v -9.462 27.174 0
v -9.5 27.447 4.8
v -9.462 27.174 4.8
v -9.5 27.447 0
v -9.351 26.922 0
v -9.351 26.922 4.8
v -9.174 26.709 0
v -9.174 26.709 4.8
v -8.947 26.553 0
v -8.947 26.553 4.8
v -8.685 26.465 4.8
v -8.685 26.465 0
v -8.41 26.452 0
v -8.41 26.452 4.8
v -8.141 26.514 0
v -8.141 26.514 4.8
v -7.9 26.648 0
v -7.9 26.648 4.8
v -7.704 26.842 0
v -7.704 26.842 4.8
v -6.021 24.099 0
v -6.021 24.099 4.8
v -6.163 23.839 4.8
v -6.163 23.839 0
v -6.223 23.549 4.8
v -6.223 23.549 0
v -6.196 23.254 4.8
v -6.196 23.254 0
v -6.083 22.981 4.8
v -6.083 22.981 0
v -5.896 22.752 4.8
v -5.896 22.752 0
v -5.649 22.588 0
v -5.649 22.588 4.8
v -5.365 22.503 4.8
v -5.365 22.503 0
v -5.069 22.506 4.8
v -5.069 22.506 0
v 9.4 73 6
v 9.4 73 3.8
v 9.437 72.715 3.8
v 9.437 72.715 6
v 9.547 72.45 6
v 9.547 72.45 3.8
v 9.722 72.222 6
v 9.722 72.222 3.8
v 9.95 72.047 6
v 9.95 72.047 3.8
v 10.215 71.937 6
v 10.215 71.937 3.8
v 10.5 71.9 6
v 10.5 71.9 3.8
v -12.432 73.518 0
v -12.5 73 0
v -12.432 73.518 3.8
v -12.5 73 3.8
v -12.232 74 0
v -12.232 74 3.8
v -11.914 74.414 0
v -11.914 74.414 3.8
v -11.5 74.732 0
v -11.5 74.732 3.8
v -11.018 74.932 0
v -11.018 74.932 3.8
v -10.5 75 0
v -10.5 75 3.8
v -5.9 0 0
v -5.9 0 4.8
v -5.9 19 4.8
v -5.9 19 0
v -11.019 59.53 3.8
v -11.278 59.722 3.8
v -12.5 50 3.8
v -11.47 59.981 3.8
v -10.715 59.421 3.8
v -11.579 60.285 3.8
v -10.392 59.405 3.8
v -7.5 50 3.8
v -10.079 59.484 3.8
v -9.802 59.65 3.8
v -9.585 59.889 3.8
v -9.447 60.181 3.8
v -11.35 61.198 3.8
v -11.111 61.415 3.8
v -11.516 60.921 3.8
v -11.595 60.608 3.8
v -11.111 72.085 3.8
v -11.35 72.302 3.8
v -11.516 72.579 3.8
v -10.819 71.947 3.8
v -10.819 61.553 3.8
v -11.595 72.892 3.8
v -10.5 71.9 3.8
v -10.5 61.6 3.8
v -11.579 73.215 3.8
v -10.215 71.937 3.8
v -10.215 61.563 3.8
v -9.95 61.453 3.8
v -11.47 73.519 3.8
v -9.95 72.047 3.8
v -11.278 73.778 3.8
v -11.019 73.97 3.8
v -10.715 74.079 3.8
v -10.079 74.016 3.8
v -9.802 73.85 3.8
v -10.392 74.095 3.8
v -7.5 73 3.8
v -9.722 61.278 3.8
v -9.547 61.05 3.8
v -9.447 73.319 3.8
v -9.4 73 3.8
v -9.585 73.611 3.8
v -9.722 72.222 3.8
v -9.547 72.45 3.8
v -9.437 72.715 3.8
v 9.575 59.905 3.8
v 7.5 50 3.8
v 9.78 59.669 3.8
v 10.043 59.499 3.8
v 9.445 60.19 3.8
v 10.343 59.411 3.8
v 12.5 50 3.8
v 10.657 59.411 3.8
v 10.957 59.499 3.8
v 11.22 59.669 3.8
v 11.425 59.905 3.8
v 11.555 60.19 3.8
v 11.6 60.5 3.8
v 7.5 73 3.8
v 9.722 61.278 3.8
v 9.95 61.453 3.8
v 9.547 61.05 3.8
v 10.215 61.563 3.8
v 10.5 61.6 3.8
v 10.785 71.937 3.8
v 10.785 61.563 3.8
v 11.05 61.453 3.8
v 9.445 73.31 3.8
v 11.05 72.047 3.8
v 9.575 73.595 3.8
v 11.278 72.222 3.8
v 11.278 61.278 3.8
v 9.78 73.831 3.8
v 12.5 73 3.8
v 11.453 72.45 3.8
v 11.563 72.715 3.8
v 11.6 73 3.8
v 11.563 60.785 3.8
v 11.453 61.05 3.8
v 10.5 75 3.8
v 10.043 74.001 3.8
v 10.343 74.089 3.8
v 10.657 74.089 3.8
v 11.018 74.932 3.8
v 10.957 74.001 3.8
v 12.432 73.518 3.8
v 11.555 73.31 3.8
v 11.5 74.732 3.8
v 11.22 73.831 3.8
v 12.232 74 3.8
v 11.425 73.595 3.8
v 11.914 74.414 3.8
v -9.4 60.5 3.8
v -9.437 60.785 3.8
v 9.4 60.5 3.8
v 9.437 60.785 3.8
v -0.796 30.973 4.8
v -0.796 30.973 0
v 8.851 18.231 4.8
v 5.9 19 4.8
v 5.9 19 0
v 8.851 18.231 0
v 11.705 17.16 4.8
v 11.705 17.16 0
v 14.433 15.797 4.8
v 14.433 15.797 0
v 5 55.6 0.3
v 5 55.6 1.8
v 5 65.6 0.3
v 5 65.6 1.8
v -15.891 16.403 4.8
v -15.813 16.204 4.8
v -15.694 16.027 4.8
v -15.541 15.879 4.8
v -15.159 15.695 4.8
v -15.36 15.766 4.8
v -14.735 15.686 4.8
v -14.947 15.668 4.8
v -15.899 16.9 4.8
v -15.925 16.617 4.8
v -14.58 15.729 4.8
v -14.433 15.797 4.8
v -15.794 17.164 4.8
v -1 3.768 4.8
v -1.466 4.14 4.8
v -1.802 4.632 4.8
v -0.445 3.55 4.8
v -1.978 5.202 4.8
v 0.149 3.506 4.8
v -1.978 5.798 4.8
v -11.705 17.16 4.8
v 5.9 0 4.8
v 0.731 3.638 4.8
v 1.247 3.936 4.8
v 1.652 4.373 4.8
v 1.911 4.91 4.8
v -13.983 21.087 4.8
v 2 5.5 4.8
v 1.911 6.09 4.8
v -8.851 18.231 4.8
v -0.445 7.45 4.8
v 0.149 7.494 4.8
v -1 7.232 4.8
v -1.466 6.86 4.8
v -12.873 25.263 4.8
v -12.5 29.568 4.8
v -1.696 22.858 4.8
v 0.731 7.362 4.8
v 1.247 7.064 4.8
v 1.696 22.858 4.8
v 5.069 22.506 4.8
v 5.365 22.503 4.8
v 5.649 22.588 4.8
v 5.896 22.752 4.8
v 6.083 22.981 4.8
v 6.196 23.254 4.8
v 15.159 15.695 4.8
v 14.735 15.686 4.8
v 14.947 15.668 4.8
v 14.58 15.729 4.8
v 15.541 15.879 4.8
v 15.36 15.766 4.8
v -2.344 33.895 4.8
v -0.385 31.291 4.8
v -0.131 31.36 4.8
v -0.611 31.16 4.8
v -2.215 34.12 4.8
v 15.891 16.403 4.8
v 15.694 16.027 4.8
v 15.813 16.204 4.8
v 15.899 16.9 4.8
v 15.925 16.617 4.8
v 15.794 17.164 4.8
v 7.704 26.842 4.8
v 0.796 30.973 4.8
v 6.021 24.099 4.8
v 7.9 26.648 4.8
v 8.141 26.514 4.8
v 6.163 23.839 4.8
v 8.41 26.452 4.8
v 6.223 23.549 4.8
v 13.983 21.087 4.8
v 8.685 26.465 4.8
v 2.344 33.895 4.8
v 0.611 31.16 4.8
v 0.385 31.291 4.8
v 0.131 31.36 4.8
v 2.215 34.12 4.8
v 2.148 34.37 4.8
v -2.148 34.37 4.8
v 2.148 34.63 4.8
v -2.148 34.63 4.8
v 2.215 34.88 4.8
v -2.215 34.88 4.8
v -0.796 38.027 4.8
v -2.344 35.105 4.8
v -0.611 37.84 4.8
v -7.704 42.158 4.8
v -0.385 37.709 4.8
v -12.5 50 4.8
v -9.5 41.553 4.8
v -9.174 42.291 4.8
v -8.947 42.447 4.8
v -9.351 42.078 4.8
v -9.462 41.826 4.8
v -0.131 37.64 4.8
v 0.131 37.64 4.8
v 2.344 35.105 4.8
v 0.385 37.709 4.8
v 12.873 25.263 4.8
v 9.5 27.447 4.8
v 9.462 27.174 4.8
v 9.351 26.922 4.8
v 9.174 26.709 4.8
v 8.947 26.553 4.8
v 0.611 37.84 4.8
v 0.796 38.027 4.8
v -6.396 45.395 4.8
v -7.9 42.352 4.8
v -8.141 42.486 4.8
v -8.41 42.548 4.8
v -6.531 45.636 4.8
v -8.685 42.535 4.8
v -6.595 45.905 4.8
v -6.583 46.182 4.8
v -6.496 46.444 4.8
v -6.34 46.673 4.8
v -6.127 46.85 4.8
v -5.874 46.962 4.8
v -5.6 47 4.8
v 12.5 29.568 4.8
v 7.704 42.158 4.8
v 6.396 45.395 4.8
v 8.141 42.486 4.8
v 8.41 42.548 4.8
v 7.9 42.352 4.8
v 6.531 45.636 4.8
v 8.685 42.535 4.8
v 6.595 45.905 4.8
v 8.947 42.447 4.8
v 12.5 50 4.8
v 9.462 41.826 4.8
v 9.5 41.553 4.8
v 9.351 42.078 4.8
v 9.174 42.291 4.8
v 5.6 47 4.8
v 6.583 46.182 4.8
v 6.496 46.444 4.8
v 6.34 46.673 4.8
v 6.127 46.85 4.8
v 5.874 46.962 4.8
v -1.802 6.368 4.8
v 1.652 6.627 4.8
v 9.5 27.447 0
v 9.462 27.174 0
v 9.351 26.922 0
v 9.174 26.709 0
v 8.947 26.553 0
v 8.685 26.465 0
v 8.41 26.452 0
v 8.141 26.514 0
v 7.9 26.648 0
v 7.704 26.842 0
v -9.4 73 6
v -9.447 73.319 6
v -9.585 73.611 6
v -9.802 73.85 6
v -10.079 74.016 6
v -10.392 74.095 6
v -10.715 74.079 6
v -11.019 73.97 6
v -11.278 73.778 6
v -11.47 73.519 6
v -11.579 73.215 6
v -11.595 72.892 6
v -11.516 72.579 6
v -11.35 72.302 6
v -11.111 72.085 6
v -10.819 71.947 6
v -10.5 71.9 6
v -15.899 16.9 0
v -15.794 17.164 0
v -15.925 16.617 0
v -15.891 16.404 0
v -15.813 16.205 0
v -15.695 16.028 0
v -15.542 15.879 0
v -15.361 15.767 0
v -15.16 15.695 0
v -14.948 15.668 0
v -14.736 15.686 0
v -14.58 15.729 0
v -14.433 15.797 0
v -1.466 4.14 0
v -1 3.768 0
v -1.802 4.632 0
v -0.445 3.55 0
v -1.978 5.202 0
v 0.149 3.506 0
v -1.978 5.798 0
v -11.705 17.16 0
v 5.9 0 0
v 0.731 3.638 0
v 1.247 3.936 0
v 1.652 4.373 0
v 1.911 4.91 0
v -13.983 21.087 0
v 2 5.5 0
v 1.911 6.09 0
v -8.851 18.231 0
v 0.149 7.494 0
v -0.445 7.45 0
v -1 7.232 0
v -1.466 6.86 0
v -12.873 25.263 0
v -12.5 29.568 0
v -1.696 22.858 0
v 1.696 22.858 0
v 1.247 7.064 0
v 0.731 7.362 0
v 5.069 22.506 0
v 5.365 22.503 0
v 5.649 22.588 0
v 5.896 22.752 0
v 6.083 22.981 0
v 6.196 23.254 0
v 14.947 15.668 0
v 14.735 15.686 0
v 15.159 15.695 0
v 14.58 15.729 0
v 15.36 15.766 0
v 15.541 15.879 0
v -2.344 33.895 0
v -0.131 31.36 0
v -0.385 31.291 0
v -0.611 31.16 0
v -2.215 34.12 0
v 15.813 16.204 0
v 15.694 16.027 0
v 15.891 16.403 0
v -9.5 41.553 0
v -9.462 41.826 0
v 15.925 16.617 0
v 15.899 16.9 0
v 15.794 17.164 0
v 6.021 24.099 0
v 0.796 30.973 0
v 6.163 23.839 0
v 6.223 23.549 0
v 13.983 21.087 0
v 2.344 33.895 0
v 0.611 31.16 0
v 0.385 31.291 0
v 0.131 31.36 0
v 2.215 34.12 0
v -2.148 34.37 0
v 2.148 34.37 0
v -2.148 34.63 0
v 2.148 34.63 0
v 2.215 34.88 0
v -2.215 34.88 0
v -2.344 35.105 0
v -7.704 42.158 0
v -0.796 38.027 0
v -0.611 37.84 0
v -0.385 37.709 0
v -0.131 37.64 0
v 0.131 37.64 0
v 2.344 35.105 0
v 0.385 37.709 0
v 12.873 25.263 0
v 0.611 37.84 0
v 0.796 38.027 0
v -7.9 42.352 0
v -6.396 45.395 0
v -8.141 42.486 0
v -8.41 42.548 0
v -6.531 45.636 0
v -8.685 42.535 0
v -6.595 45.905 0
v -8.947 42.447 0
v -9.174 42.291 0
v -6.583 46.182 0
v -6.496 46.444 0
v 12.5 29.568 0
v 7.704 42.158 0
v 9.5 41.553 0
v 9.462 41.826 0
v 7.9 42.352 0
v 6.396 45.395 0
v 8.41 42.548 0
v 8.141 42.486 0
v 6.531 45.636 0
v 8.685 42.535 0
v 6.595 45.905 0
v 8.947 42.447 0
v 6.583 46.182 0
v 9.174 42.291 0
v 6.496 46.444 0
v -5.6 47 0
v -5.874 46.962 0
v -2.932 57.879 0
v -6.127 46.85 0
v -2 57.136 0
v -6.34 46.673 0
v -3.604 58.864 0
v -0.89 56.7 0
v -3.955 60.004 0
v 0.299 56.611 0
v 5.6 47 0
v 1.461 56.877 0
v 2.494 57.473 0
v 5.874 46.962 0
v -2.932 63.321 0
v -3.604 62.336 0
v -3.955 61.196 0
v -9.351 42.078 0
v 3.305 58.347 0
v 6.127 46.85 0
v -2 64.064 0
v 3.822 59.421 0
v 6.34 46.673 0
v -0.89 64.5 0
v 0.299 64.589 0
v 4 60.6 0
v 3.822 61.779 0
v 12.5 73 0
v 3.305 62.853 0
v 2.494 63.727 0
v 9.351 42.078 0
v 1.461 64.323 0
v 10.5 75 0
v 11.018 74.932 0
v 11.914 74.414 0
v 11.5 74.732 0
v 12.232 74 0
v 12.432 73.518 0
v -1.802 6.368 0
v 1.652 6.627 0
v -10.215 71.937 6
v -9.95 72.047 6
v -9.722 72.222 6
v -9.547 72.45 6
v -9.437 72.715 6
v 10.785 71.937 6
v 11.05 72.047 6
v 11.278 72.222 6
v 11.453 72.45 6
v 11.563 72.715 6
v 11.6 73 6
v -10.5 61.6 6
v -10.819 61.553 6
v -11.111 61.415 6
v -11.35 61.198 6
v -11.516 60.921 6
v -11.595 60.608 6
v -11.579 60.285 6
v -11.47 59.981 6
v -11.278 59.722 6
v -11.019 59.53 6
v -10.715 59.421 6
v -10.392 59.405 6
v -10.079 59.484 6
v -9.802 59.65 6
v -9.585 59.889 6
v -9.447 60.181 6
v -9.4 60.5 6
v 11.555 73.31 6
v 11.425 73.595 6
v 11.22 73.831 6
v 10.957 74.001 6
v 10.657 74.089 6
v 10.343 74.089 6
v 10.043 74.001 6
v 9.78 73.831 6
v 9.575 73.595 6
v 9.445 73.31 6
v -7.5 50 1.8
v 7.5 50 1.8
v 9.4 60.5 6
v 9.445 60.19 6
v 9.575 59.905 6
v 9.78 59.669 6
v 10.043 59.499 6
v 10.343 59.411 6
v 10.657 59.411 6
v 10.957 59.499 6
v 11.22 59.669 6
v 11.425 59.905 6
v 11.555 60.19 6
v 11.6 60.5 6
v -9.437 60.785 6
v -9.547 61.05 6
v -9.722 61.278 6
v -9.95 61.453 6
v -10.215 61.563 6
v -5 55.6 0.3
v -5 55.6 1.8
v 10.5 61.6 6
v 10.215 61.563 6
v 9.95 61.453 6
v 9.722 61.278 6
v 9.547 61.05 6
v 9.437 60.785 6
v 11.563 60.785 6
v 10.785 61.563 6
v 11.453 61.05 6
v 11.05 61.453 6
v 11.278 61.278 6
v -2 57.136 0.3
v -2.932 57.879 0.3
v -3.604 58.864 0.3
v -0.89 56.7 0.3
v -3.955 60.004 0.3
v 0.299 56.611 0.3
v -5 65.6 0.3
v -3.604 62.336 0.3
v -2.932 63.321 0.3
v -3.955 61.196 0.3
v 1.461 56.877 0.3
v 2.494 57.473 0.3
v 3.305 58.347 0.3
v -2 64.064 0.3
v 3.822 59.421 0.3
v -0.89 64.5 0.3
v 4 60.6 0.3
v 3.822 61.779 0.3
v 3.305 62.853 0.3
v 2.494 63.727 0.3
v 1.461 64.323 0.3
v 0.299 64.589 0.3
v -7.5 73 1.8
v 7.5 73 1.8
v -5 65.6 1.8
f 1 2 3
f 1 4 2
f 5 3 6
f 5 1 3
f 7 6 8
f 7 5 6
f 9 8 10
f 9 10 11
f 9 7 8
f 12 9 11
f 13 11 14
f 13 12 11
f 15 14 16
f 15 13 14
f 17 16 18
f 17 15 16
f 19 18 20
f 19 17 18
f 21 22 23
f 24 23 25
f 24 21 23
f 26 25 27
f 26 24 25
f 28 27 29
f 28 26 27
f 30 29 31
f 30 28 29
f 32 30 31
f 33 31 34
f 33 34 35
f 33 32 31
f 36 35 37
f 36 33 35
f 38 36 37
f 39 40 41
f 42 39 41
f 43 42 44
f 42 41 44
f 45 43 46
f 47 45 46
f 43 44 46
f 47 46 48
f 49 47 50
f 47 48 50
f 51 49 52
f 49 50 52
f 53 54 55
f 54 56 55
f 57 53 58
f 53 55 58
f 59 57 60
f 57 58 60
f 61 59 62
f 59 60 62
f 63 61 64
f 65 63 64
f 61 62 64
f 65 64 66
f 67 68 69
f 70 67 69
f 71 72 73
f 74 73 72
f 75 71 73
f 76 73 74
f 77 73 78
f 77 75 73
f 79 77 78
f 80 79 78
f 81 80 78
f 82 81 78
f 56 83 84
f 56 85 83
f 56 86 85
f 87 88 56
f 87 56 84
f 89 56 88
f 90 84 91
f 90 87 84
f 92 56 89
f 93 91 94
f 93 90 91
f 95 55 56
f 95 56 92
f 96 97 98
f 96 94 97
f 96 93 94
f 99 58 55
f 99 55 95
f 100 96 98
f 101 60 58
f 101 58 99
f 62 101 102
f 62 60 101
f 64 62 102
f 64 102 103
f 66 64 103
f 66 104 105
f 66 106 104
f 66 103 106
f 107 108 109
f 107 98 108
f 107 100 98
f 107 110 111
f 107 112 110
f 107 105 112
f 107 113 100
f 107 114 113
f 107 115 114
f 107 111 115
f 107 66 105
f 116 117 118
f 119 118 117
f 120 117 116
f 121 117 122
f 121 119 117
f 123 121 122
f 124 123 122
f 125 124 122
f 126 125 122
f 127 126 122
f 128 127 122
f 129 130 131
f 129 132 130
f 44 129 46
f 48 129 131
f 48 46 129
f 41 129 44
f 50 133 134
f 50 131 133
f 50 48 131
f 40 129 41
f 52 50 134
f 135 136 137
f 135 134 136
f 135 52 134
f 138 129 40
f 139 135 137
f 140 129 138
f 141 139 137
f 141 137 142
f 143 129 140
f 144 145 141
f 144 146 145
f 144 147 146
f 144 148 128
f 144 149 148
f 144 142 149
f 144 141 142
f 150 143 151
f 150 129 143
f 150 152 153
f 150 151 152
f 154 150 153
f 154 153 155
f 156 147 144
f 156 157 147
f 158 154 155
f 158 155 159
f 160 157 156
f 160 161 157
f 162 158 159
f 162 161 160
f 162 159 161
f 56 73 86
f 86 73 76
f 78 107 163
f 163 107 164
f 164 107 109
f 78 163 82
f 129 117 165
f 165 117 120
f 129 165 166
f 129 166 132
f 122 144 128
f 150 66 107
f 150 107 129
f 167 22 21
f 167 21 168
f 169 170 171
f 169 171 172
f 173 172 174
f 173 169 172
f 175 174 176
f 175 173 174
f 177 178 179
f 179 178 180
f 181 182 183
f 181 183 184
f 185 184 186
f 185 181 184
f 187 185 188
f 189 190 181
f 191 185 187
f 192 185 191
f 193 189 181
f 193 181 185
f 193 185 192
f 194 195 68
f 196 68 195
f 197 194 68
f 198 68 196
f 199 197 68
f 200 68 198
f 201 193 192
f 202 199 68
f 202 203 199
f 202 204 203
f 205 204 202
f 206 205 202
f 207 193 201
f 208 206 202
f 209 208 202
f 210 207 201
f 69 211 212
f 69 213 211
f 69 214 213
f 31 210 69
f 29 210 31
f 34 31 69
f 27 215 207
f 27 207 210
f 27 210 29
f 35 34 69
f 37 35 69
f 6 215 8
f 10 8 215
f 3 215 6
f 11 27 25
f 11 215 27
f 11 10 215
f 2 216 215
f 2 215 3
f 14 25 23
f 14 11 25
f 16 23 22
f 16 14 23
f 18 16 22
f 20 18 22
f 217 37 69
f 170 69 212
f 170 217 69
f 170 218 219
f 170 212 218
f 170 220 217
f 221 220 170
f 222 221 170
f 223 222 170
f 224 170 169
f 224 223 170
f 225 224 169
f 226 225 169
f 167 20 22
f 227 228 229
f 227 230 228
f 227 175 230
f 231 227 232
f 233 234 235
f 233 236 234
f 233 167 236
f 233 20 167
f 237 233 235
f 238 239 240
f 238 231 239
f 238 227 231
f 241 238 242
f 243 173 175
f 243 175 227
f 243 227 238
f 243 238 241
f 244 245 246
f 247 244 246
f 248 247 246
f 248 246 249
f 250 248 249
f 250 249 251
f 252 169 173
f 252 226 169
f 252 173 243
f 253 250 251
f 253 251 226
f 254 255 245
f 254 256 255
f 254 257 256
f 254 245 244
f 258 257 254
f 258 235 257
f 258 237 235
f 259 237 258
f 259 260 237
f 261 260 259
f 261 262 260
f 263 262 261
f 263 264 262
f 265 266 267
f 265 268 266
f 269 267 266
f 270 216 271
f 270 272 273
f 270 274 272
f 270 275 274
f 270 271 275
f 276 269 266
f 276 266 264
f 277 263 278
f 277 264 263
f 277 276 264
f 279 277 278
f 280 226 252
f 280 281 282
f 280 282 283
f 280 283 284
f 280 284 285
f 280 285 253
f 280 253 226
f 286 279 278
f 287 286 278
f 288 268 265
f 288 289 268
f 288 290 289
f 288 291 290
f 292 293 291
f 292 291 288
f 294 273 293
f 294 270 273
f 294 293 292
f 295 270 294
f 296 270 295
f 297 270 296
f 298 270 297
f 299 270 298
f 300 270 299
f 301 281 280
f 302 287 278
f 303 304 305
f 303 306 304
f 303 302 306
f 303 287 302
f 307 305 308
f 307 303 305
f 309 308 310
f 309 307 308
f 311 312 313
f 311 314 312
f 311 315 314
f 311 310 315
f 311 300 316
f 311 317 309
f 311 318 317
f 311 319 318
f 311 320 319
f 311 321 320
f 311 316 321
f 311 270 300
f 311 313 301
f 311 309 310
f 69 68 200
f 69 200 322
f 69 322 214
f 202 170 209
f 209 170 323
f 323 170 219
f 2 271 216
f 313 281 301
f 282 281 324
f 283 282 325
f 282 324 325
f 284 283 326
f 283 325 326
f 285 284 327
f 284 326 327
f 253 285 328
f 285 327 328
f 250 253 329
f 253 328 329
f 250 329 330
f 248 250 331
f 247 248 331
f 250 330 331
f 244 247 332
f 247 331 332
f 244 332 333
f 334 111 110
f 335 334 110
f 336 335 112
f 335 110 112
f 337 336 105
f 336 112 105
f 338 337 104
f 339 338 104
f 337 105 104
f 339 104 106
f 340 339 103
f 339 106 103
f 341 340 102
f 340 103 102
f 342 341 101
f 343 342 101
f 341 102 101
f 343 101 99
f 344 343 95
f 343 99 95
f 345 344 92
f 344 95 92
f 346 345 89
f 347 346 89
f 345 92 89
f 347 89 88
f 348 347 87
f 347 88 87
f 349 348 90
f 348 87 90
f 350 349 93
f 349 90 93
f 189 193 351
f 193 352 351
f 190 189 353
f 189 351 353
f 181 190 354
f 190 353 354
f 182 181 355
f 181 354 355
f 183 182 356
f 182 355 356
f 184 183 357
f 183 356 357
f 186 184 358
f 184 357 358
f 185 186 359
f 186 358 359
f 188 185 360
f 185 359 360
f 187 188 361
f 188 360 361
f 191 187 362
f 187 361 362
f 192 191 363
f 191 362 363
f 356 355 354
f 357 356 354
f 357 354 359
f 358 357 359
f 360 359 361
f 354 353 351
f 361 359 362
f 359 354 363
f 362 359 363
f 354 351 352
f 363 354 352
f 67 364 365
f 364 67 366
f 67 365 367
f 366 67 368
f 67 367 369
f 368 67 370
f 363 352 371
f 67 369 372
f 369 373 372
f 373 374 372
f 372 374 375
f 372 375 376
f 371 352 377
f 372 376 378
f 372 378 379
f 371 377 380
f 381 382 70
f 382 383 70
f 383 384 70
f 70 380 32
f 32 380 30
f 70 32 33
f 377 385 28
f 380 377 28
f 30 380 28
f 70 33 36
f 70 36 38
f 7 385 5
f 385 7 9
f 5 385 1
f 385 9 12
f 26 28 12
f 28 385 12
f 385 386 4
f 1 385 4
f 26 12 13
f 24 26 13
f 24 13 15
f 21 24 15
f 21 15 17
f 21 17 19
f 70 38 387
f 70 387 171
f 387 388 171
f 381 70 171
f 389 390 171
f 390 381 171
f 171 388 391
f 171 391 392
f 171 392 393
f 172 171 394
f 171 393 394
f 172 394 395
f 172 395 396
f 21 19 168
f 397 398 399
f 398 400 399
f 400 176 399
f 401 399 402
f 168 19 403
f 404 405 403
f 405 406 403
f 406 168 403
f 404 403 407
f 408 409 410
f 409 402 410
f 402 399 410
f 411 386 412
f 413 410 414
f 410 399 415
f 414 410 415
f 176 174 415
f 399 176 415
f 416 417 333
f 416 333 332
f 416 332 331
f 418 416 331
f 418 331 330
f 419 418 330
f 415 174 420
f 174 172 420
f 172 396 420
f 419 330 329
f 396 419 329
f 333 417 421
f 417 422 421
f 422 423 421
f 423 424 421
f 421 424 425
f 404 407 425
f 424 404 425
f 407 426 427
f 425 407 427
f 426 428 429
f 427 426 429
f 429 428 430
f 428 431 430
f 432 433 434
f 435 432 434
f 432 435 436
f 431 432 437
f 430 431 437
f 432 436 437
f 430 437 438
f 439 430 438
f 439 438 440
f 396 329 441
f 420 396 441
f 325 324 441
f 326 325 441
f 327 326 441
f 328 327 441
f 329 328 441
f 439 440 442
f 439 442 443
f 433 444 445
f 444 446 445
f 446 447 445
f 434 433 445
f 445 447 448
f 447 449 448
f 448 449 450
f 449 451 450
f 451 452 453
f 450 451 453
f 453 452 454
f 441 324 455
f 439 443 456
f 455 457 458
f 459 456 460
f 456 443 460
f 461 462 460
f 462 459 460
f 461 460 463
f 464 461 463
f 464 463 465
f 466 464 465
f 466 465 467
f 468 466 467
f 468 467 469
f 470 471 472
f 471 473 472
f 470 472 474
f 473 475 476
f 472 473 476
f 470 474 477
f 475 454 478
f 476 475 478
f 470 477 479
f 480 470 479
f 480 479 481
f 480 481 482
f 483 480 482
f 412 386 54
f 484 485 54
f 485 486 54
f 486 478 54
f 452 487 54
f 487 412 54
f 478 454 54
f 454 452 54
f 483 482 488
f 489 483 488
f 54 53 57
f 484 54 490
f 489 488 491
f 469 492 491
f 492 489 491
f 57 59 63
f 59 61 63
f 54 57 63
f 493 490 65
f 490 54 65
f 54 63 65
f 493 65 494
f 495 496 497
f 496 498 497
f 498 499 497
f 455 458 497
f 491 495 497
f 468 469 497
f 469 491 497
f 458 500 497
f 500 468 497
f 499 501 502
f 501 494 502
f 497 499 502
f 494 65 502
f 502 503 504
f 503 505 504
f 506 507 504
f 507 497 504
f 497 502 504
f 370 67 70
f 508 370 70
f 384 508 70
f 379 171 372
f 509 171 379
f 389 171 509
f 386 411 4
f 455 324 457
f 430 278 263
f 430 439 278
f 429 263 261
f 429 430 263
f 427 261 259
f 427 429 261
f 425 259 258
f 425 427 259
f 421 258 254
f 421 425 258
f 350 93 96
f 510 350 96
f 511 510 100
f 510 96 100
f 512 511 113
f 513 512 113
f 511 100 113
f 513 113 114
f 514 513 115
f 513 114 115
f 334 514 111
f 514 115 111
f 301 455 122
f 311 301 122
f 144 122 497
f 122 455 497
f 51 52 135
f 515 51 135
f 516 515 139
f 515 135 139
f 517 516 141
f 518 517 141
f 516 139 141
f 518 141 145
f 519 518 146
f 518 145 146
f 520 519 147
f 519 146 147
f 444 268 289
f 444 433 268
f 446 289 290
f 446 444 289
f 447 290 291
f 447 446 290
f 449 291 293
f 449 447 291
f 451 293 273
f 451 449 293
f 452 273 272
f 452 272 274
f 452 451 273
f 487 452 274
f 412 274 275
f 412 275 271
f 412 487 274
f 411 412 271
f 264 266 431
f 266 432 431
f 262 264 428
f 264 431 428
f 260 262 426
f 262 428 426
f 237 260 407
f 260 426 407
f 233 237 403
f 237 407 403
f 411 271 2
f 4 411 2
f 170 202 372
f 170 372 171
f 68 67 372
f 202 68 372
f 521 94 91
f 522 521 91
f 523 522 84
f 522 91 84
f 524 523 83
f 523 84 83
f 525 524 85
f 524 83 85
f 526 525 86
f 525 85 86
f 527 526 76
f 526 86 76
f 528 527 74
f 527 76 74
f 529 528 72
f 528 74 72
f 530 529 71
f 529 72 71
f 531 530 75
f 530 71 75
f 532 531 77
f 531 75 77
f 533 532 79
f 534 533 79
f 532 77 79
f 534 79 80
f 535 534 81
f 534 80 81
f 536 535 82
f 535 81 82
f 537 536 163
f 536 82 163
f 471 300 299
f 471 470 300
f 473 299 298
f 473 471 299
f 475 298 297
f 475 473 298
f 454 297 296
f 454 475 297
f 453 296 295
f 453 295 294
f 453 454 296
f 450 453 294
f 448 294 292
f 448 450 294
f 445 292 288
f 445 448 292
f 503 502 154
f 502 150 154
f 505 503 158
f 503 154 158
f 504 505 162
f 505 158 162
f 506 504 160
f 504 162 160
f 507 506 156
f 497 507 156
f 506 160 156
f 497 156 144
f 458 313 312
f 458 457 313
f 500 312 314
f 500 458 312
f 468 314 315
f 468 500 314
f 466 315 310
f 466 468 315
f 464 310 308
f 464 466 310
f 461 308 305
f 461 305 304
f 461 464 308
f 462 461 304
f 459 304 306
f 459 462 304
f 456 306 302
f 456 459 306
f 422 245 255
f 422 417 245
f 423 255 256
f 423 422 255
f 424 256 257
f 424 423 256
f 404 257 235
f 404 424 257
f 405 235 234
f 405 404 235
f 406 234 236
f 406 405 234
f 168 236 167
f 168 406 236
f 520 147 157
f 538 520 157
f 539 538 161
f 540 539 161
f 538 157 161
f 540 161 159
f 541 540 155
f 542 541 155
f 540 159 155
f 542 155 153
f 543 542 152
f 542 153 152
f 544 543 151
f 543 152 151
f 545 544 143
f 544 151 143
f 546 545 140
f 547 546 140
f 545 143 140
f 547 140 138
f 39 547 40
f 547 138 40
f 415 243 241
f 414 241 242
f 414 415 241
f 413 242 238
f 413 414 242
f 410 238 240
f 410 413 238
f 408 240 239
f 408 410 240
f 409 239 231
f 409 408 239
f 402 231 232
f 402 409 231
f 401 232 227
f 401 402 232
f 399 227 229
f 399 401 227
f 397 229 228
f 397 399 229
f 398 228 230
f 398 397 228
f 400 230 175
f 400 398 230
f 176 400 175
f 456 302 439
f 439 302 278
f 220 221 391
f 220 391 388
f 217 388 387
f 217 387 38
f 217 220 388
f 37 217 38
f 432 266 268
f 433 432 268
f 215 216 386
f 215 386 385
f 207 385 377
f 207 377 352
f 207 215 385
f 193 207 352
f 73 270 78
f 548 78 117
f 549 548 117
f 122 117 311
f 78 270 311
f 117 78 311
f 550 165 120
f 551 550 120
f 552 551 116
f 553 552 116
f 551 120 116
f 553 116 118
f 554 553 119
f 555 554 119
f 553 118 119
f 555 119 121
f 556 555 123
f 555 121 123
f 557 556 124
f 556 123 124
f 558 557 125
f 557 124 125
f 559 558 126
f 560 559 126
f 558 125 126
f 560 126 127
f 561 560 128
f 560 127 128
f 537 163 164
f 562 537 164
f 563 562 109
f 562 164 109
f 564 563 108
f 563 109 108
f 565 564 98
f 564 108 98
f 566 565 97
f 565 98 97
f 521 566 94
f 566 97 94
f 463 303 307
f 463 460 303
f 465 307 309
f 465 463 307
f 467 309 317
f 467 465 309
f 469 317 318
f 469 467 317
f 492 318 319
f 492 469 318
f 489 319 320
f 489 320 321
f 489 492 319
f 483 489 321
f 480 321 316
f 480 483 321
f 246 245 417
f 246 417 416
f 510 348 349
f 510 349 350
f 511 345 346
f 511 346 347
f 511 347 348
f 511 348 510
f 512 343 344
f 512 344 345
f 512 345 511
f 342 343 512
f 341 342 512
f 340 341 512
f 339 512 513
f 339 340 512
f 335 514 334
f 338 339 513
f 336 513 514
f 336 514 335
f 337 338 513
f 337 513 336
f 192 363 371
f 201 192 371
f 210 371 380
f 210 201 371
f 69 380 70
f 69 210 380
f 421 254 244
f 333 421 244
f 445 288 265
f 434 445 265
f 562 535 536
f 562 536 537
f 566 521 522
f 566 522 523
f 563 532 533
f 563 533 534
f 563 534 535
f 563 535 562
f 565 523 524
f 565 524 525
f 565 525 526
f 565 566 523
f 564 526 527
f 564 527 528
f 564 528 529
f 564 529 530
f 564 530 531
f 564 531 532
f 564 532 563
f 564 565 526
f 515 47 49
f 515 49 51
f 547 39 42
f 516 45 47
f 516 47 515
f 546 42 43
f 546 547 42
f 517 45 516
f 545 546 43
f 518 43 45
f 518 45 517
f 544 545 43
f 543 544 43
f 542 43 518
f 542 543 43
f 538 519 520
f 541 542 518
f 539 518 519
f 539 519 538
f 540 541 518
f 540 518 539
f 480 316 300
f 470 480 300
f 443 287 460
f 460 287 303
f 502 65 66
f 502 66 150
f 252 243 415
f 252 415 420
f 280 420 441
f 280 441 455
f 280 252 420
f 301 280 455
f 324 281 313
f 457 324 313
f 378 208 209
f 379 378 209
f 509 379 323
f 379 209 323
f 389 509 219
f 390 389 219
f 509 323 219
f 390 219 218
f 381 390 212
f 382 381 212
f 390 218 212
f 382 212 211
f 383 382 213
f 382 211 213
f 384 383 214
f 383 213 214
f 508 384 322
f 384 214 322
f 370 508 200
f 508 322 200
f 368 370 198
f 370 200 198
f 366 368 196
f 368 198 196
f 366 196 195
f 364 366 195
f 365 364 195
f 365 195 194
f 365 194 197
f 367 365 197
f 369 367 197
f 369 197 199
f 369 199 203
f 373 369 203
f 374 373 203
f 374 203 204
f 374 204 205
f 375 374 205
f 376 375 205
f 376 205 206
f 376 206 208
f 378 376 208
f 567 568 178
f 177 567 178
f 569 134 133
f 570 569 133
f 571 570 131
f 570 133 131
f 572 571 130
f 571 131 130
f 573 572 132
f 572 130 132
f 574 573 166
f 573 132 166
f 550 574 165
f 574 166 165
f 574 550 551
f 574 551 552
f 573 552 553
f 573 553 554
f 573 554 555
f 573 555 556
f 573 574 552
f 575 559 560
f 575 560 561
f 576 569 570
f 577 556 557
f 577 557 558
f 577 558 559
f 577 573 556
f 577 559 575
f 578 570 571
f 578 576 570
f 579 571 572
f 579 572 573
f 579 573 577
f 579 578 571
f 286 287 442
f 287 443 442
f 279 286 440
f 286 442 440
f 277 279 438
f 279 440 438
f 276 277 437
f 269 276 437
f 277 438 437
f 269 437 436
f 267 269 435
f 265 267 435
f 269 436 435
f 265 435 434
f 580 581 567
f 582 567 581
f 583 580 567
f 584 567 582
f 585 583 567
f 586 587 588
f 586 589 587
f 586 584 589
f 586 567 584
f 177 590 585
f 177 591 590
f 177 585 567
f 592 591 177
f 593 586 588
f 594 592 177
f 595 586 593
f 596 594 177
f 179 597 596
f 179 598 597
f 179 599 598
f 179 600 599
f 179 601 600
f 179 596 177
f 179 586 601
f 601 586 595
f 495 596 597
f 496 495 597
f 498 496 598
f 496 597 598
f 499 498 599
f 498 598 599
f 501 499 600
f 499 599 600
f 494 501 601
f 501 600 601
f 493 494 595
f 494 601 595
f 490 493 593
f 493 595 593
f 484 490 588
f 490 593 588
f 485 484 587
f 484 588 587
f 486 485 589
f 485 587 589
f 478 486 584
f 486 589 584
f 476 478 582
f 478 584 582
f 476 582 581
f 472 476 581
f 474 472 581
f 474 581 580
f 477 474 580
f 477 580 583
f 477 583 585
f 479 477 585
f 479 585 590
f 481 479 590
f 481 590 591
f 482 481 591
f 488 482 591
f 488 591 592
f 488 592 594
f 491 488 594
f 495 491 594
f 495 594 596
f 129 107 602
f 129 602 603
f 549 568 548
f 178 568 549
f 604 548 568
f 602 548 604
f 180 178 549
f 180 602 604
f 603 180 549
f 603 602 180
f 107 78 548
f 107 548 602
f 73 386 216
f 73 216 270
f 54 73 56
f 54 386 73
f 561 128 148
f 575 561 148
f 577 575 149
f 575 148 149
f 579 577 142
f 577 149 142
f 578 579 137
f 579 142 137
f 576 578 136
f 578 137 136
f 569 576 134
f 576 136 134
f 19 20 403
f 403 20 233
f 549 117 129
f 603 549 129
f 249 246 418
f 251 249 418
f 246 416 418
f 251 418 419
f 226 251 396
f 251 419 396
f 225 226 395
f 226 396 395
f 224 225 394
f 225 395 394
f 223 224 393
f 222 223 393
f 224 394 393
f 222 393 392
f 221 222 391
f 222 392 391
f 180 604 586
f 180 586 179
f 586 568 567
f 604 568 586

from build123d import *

# Parameters (mm, degrees)
SKIZZE1_W                            = 25
SKIZZE1_H                            = 75
AUFSATZ_LINEAR_AUSTRAGEN1_DEPTH      = 4.8
SCHNITT_LINEAR_AUSTRAGEN1_DEPTH      = 5
SKIZZE3_W                            = 25
SKIZZE3_H                            = 25
SCHNITT_LINEAR_AUSTRAGEN2_DEPTH      = 1
SKIZZE4_W                            = 15
SKIZZE4_H                            = 23
SCHNITT_LINEAR_AUSTRAGEN3_DEPTH      = 2
SKIZZE5_R                            = 4
SCHNITT_LINEAR_AUSTRAGEN4_DEPTH      = 2.8
SKIZZE6_W                            = 10
SKIZZE6_H                            = 10
SKIZZE6_R                            = 4
SCHNITT_LINEAR_AUSTRAGEN5_DEPTH      = 1.5
AUFSATZ_LINEAR_AUSTRAGEN2_DEPTH      = 6
SKIZZE8_R                            = 2
SCHNITT_LINEAR_AUSTRAGEN6_DEPTH      = 2.2
SCHNITT_LINEAR_AUSTRAGEN6_DEPTH_BACK = 5.8
SKIZZE9_W                            = 6.6
SKIZZE9_H                            = 19
SCHNITT_LINEAR_AUSTRAGEN7_DEPTH      = 5.8
AUFSATZ_LINEAR_AUSTRAGEN3_DEPTH      = 4.8
VERRUNDUNG1_R                        = 2
VERRUNDUNG2_R                        = 1
SCHNITT_LINEAR_AUSTRAGEN8_DEPTH      = 5.8000001
VERRUNDUNG3_R                        = 1


with BuildPart() as part:
    # Skizze1 → Aufsatz-Linear austragen1 (new body)
    with BuildSketch(Plane.XY):
        with Locations((0, 37.5)):
            Rectangle(SKIZZE1_W, SKIZZE1_H)
    extrude(amount=AUFSATZ_LINEAR_AUSTRAGEN1_DEPTH)

    # Skizze2 → Schnitt-Linear austragen1 (cut)
    with BuildSketch(Plane.XY.offset(4.8)):
        with BuildLine():
            ThreePointArc((-9.4, 73), (-11.277817459, 73.777817459), (-10.5, 71.9))
            Line((-10.5, 71.9), (-10.5, 73))
            Line((-10.5, 73), (-9.4, 73))
        make_face()
        with BuildLine():
            Line((-10.5, 73), (-10.5, 71.9))
            ThreePointArc((-10.5, 71.9), (-9.722182541, 72.222182541), (-9.4, 73))
            Line((-9.4, 73), (-10.5, 73))
        make_face()
        with BuildLine():
            ThreePointArc((9.4, 73), (9.722182541, 72.222182541), (10.5, 71.9))
            Line((10.5, 71.9), (10.5, 73))
            Line((10.5, 73), (9.4, 73))
        make_face()
        with BuildLine():
            Line((10.5, 73), (10.5, 71.9))
            ThreePointArc((10.5, 71.9), (11.277817459, 72.222182541), (11.6, 73))
            ThreePointArc((11.6, 73), (10.5, 74.1), (9.4, 73))
            Line((9.4, 73), (10.5, 73))
        make_face()
        with BuildLine():
            ThreePointArc((9.4, 73), (9.722182541, 72.222182541), (10.5, 71.9))
            Line((10.5, 71.9), (10.5, 73))
            Line((10.5, 73), (9.4, 73))
        make_face()
        with BuildLine():
            Line((10.5, 73), (10.5, 71.9))
            ThreePointArc((10.5, 71.9), (11.277817459, 72.222182541), (11.6, 73))
            ThreePointArc((11.6, 73), (10.5, 74.1), (9.4, 73))
            Line((9.4, 73), (10.5, 73))
        make_face()
        with BuildLine():
            ThreePointArc((-10.5, 61.6), (-11.277817459, 59.722182541), (-9.4, 60.5))
            Line((-9.4, 60.5), (-10.5, 60.5))
            Line((-10.5, 60.5), (-10.5, 61.6))
        make_face()
        with BuildLine():
            Line((-10.5, 60.5), (-9.4, 60.5))
            ThreePointArc((-9.4, 60.5), (-9.722182541, 61.277817459), (-10.5, 61.6))
            Line((-10.5, 61.6), (-10.5, 60.5))
        make_face()
        with BuildLine():
            ThreePointArc((-10.5, 61.6), (-11.277817459, 59.722182541), (-9.4, 60.5))
            Line((-9.4, 60.5), (-10.5, 60.5))
            Line((-10.5, 60.5), (-10.5, 61.6))
        make_face()
        with BuildLine():
            Line((-10.5, 60.5), (-9.4, 60.5))
            ThreePointArc((-9.4, 60.5), (-9.722182541, 61.277817459), (-10.5, 61.6))
            Line((-10.5, 61.6), (-10.5, 60.5))
        make_face()
        with BuildLine():
            ThreePointArc((10.5, 61.6), (9.722182541, 61.277817459), (9.4, 60.5))
            Line((9.4, 60.5), (10.5, 60.5))
            Line((10.5, 60.5), (10.5, 61.6))
        make_face()
        with BuildLine():
            Line((10.5, 60.5), (9.4, 60.5))
            ThreePointArc((9.4, 60.5), (10.5, 59.4), (11.6, 60.5))
            ThreePointArc((11.6, 60.5), (11.277817459, 61.277817459), (10.5, 61.6))
            Line((10.5, 61.6), (10.5, 60.5))
        make_face()
        with BuildLine():
            ThreePointArc((10.5, 61.6), (9.722182541, 61.277817459), (9.4, 60.5))
            Line((9.4, 60.5), (10.5, 60.5))
            Line((10.5, 60.5), (10.5, 61.6))
        make_face()
        with BuildLine():
            Line((10.5, 60.5), (9.4, 60.5))
            ThreePointArc((9.4, 60.5), (10.5, 59.4), (11.6, 60.5))
            ThreePointArc((11.6, 60.5), (11.277817459, 61.277817459), (10.5, 61.6))
            Line((10.5, 61.6), (10.5, 60.5))
        make_face()
        with BuildLine():
            ThreePointArc((-9.4, 73), (-11.277817459, 73.777817459), (-10.5, 71.9))
            Line((-10.5, 71.9), (-10.5, 73))
            Line((-10.5, 73), (-9.4, 73))
        make_face()
        with BuildLine():
            Line((-10.5, 73), (-10.5, 71.9))
            ThreePointArc((-10.5, 71.9), (-9.722182541, 72.222182541), (-9.4, 73))
            Line((-9.4, 73), (-10.5, 73))
        make_face()
    extrude(amount=-SCHNITT_LINEAR_AUSTRAGEN1_DEPTH, mode=Mode.SUBTRACT)

    # Skizze3 → Schnitt-Linear austragen2 (cut)
    with BuildSketch(Plane.XY.offset(4.8)):
        with Locations((0, 62.5)):
            Rectangle(SKIZZE3_W, SKIZZE3_H)
    extrude(amount=-SCHNITT_LINEAR_AUSTRAGEN2_DEPTH, mode=Mode.SUBTRACT)

    # Skizze4 → Schnitt-Linear austragen3 (cut)
    with BuildSketch(Plane.XY.offset(3.8)):
        with Locations((0, 61.5)):
            Rectangle(SKIZZE4_W, SKIZZE4_H)
    extrude(amount=-SCHNITT_LINEAR_AUSTRAGEN3_DEPTH, mode=Mode.SUBTRACT)

    # Skizze5 → Schnitt-Linear austragen4 (cut, through all)
    with BuildSketch(Plane.XY.offset(1.8)):
        with Locations((0, 60.6)):
            Circle(SKIZZE5_R)
    extrude(amount=-SCHNITT_LINEAR_AUSTRAGEN4_DEPTH, mode=Mode.SUBTRACT)

    # Skizze6 → Schnitt-Linear austragen5 (cut)
    with BuildSketch(Plane.XY.offset(1.8)):
        with Locations((0, 60.6)):
            Rectangle(SKIZZE6_W, SKIZZE6_H)
        with Locations((0, 60.6)):
            Circle(SKIZZE6_R, mode=Mode.SUBTRACT)
    extrude(amount=-SCHNITT_LINEAR_AUSTRAGEN5_DEPTH, mode=Mode.SUBTRACT)

    # Skizze7 → Aufsatz-Linear austragen2 (add)
    with BuildSketch(Plane.XY):
        with BuildLine():
            ThreePointArc((-10.5, 61.6), (-11.277817459, 59.722182541), (-9.4, 60.5))
            Line((-9.4, 60.5), (-10.5, 60.5))
            Line((-10.5, 60.5), (-10.5, 61.6))
        make_face()
        with BuildLine():
            Line((-10.5, 60.5), (-9.4, 60.5))
            ThreePointArc((-9.4, 60.5), (-9.722182541, 61.277817459), (-10.5, 61.6))
            Line((-10.5, 61.6), (-10.5, 60.5))
        make_face()
        with BuildLine():
            ThreePointArc((-9.4, 73), (-11.277817459, 73.777817459), (-10.5, 71.9))
            Line((-10.5, 71.9), (-10.5, 73))
            Line((-10.5, 73), (-9.4, 73))
        make_face()
        with BuildLine():
            Line((-10.5, 73), (-10.5, 71.9))
            ThreePointArc((-10.5, 71.9), (-9.722182541, 72.222182541), (-9.4, 73))
            Line((-9.4, 73), (-10.5, 73))
        make_face()
        with BuildLine():
            ThreePointArc((10.5, 61.6), (9.722182541, 61.277817459), (9.4, 60.5))
            Line((9.4, 60.5), (10.5, 60.5))
            Line((10.5, 60.5), (10.5, 61.6))
        make_face()
        with BuildLine():
            Line((10.5, 60.5), (9.4, 60.5))
            ThreePointArc((9.4, 60.5), (10.5, 59.4), (11.6, 60.5))
            ThreePointArc((11.6, 60.5), (11.277817459, 61.277817459), (10.5, 61.6))
            Line((10.5, 61.6), (10.5, 60.5))
        make_face()
        with BuildLine():
            ThreePointArc((9.4, 73), (9.722182541, 72.222182541), (10.5, 71.9))
            Line((10.5, 71.9), (10.5, 73))
            Line((10.5, 73), (9.4, 73))
        make_face()
        with BuildLine():
            Line((10.5, 73), (10.5, 71.9))
            ThreePointArc((10.5, 71.9), (11.277817459, 72.222182541), (11.6, 73))
            ThreePointArc((11.6, 73), (10.5, 74.1), (9.4, 73))
            Line((9.4, 73), (10.5, 73))
        make_face()
        with BuildLine():
            ThreePointArc((9.4, 73), (9.722182541, 72.222182541), (10.5, 71.9))
            Line((10.5, 71.9), (10.5, 73))
            Line((10.5, 73), (9.4, 73))
        make_face()
        with BuildLine():
            Line((10.5, 73), (10.5, 71.9))
            ThreePointArc((10.5, 71.9), (11.277817459, 72.222182541), (11.6, 73))
            ThreePointArc((11.6, 73), (10.5, 74.1), (9.4, 73))
            Line((9.4, 73), (10.5, 73))
        make_face()
        with BuildLine():
            ThreePointArc((10.5, 61.6), (9.722182541, 61.277817459), (9.4, 60.5))
            Line((9.4, 60.5), (10.5, 60.5))
            Line((10.5, 60.5), (10.5, 61.6))
        make_face()
        with BuildLine():
            Line((10.5, 60.5), (9.4, 60.5))
            ThreePointArc((9.4, 60.5), (10.5, 59.4), (11.6, 60.5))
            ThreePointArc((11.6, 60.5), (11.277817459, 61.277817459), (10.5, 61.6))
            Line((10.5, 61.6), (10.5, 60.5))
        make_face()
        with BuildLine():
            ThreePointArc((-10.5, 61.6), (-11.277817459, 59.722182541), (-9.4, 60.5))
            Line((-9.4, 60.5), (-10.5, 60.5))
            Line((-10.5, 60.5), (-10.5, 61.6))
        make_face()
        with BuildLine():
            Line((-10.5, 60.5), (-9.4, 60.5))
            ThreePointArc((-9.4, 60.5), (-9.722182541, 61.277817459), (-10.5, 61.6))
            Line((-10.5, 61.6), (-10.5, 60.5))
        make_face()
        with BuildLine():
            ThreePointArc((-9.4, 73), (-11.277817459, 73.777817459), (-10.5, 71.9))
            Line((-10.5, 71.9), (-10.5, 73))
            Line((-10.5, 73), (-9.4, 73))
        make_face()
        with BuildLine():
            Line((-10.5, 73), (-10.5, 71.9))
            ThreePointArc((-10.5, 71.9), (-9.722182541, 72.222182541), (-9.4, 73))
            Line((-9.4, 73), (-10.5, 73))
        make_face()
    extrude(amount=AUFSATZ_LINEAR_AUSTRAGEN2_DEPTH)

    # Skizze8 → Schnitt-Linear austragen6 (cut, two sides)
    with BuildSketch(Plane.XY.offset(4.8)) as schnitt_linear_austragen6_sk:
        with Locations((0, 5.5)):
            Circle(SKIZZE8_R)
    extrude(amount=SCHNITT_LINEAR_AUSTRAGEN6_DEPTH, mode=Mode.SUBTRACT)
    extrude(schnitt_linear_austragen6_sk.sketch, amount=-SCHNITT_LINEAR_AUSTRAGEN6_DEPTH_BACK, mode=Mode.SUBTRACT)

    # Skizze9 → Schnitt-Linear austragen7 (cut, through all)
    with BuildSketch(Plane.XY.offset(4.8)):
        with Locations((-9.2, 9.5)):
            Rectangle(SKIZZE9_W, SKIZZE9_H)
        with Locations((9.2, 9.5)):
            Rectangle(SKIZZE9_W, SKIZZE9_H)
    extrude(amount=-SCHNITT_LINEAR_AUSTRAGEN7_DEPTH, mode=Mode.SUBTRACT)

    # Skizze10 → Aufsatz-Linear austragen3 (add)
    with BuildSketch(Plane.XY.offset(4.8)):
        with BuildLine():
            ThreePointArc((-20.231626451, 11.490217952), (-13.594656371, 16.254350305), (-5.9, 19))
            Line((-5.9, 19), (-12.5, 19))
            Line((-12.5, 19), (-12.5, 29.567918994))
            ThreePointArc((-12.5, 29.567918994), (-14.514033208, 19.73708329), (-20.231626451, 11.490217952))
        make_face()
        with BuildLine():
            ThreePointArc((5.9, 19), (13.594656371, 16.254350305), (20.231626451, 11.490217952))
            ThreePointArc((20.231626451, 11.490217952), (14.514033208, 19.73708329), (12.5, 29.567918994))
            Line((12.5, 29.567918994), (12.5, 19))
            Line((12.5, 19), (5.9, 19))
        make_face()
    extrude(amount=-AUFSATZ_LINEAR_AUSTRAGEN3_DEPTH)

    # Verrundung1
    verrundung1_edges = [part.edges().sort_by_distance(p)[0] for p in [
        (-12.5, 75, 1.9),
        (12.5, 75, 1.9),
    ]]
    fillet(verrundung1_edges, radius=VERRUNDUNG1_R)

    # Verrundung2
    verrundung2_edges = [part.edges().sort_by_distance(p)[0] for p in [
        (-20.231626451, 11.490217952, 2.4),
        (20.231626451, 11.490217952, 2.4),
    ]]
    fillet(verrundung2_edges, radius=VERRUNDUNG2_R)

    # Skizze12 → Schnitt-Linear austragen8 (cut, through all)
    with BuildSketch(Plane.XY.offset(4.8)):
        Polygon((-1.884038216, 34.5), (-9.5, 44.521002347), (-9.5, 24.478997653), align=None)
        Polygon((0, 36.978997653), (7.615961784, 47), (-7.615961784, 47), align=None)
        Polygon((9.5, 24.478997653), (9.5, 44.521002347), (1.884038216, 34.5), align=None)
        with BuildLine():
            ThreePointArc((7.615961784, 22), (0, 22.902325259), (-7.615961784, 22))
            Line((-7.615961784, 22), (0, 32.021002347))
            Line((0, 32.021002347), (7.615961784, 22))
        make_face()
    extrude(amount=-SCHNITT_LINEAR_AUSTRAGEN8_DEPTH, mode=Mode.SUBTRACT)

    # Verrundung3
    verrundung3_edges = [part.edges().sort_by_distance(p)[0] for p in [
        (1.884038216, 34.5, 2.4),
        (9.5, 44.521002347, 2.4),
        (9.5, 24.478997653, 2.4),
        (0, 36.978997653, 2.4),
        (-7.615961784, 47, 2.4),
        (7.615961784, 47, 2.4),
        (7.615961784, 22, 2.4),
        (-7.615961784, 22, 2.4),
        (0, 32.021002347, 2.4),
        (-1.884038216, 34.5, 2.4),
        (-9.5, 24.478997653, 2.4),
        (-9.5, 44.521002347, 2.4),
    ]]
    fillet(verrundung3_edges, radius=VERRUNDUNG3_R)


solid = part.part
